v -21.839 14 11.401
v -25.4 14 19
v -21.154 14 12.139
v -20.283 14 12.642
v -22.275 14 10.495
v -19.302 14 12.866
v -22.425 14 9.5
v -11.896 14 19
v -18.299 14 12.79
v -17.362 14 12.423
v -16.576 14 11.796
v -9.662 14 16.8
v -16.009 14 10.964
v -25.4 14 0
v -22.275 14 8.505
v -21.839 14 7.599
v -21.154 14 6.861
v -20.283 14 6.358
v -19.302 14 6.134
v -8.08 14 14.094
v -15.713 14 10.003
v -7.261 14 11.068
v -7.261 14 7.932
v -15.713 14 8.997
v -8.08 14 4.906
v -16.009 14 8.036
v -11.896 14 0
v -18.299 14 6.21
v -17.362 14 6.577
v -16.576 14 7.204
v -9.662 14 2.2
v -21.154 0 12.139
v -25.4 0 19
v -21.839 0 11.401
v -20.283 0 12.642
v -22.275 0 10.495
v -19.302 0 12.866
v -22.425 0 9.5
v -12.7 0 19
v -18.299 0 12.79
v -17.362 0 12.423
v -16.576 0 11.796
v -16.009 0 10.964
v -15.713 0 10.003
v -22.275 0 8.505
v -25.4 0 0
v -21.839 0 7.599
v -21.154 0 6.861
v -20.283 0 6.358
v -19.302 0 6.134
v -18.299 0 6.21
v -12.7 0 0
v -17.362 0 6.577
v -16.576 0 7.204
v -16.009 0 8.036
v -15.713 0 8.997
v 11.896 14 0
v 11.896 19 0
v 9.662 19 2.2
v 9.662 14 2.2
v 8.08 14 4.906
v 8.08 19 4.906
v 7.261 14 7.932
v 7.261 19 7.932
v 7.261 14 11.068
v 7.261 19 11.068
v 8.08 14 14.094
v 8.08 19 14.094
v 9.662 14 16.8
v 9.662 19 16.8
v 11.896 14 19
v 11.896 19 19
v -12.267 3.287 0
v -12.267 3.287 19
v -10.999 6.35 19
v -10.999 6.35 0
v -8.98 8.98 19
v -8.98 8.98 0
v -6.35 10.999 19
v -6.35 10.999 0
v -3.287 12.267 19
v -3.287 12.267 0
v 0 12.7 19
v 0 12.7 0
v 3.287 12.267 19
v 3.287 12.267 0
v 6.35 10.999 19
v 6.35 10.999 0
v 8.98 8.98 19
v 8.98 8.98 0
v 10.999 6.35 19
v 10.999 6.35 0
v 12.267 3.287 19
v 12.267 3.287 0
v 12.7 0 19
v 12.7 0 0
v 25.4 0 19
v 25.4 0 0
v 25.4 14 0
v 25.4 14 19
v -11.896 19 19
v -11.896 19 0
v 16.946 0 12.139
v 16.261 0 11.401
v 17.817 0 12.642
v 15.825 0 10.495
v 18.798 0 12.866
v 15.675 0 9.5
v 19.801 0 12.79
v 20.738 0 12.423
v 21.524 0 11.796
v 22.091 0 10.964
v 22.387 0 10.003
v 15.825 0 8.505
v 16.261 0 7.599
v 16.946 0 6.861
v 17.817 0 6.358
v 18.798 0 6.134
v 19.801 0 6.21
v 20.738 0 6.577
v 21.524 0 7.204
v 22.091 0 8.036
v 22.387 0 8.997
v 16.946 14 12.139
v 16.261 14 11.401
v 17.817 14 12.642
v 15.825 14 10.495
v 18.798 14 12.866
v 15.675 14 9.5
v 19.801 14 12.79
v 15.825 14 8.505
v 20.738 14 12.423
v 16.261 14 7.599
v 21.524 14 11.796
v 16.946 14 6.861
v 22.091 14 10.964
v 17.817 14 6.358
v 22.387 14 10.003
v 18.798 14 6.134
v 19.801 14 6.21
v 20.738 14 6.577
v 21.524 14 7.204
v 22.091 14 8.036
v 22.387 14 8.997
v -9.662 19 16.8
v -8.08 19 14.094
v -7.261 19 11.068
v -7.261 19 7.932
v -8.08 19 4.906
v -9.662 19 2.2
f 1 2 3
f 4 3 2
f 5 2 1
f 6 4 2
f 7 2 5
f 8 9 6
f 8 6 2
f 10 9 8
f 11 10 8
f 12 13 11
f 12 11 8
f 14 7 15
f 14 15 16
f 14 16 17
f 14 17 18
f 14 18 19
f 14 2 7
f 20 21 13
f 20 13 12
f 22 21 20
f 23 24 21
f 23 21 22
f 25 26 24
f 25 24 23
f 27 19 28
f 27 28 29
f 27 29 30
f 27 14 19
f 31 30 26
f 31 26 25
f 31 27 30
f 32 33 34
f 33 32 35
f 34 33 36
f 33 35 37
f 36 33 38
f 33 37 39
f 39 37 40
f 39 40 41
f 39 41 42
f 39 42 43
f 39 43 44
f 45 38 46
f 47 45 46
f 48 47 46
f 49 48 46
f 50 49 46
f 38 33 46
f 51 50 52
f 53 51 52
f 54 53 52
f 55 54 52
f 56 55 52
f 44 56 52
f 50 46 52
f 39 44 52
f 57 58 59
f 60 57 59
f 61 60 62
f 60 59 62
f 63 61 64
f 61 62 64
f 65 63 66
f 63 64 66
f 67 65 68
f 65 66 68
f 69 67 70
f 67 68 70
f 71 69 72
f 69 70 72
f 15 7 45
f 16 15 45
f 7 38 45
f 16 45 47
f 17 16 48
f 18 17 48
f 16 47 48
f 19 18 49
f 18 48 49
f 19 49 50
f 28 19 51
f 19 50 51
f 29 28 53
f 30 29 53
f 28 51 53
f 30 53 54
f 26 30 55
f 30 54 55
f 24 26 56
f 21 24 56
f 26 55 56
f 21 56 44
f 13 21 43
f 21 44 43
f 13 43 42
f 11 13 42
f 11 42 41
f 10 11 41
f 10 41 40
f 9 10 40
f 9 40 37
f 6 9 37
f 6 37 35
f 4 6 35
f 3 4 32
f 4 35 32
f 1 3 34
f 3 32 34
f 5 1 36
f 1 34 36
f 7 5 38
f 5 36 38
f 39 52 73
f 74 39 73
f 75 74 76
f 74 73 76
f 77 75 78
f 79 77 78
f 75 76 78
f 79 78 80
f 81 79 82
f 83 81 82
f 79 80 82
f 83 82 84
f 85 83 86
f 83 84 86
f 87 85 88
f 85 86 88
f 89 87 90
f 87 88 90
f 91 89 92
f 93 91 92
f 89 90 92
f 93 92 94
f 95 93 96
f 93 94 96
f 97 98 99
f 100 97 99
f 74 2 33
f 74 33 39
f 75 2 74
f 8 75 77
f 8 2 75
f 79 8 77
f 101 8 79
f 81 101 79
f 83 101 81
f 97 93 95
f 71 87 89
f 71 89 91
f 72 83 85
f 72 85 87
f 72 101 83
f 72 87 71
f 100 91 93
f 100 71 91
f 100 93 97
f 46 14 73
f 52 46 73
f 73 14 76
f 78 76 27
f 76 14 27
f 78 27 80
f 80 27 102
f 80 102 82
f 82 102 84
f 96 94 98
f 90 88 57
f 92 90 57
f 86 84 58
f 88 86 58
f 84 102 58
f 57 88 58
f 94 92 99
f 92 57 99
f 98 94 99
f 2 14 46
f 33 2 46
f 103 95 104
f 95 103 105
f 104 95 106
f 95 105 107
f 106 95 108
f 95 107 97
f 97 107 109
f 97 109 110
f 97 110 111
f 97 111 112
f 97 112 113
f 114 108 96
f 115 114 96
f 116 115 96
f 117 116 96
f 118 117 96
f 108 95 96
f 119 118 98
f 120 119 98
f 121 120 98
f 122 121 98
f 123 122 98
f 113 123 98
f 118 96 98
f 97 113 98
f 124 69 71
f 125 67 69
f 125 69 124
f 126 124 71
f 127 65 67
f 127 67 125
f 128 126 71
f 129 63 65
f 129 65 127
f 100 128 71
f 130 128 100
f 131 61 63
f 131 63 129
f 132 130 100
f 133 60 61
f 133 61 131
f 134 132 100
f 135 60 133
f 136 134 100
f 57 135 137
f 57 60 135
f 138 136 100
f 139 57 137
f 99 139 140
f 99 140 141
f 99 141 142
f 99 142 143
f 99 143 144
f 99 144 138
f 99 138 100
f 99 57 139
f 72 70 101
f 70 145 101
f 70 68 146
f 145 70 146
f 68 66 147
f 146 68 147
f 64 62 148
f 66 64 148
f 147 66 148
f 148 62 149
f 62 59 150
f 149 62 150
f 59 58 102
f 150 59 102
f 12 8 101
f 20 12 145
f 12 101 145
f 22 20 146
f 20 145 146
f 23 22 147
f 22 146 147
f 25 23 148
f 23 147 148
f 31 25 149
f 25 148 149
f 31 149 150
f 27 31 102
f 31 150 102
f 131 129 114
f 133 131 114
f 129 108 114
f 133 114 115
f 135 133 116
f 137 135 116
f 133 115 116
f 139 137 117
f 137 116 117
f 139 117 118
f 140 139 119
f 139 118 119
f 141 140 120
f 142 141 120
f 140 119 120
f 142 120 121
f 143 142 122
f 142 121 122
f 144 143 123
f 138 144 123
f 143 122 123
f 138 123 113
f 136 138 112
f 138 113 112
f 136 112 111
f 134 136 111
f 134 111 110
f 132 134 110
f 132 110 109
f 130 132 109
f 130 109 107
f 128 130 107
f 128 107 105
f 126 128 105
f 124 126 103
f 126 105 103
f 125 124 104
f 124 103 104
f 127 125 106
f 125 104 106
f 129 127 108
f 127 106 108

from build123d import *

# Parameters (mm, degrees)
BOSS_EXTRUDE1_DEPTH = 19
HOLE1_D             = 6.75
HOLE1_DEPTH         = 100
HOLE1_CBORE_D       = 23.785
HOLE1_CBORE_DEPTH   = 5


with BuildPart() as part:
    # Sketch1 → Boss-Extrude1 (new body)
    with BuildSketch(Plane.XY):
        with BuildLine():
            Line((12.7, 0), (25.4, 0))
            Line((25.4, 0), (25.4, 19))
            Line((25.4, 19), (-25.4, 19))
            Line((-25.4, 19), (-25.4, 0))
            Line((-25.4, 0), (-12.7, 0))
            ThreePointArc((-12.7, 0), (0, 12.7), (12.7, 0))
        make_face()
    extrude(amount=BOSS_EXTRUDE1_DEPTH)

    # Hole1
    with Locations(Plane(origin=(0, 19, 0), x_dir=(1, 0, 0), z_dir=(0, 1, 0))):
        with Locations((19.05, -9.5), (-19.05, -9.5)):
            CounterBoreHole(HOLE1_D / 2, HOLE1_CBORE_D / 2, HOLE1_CBORE_DEPTH, depth=HOLE1_DEPTH)


solid = part.part
